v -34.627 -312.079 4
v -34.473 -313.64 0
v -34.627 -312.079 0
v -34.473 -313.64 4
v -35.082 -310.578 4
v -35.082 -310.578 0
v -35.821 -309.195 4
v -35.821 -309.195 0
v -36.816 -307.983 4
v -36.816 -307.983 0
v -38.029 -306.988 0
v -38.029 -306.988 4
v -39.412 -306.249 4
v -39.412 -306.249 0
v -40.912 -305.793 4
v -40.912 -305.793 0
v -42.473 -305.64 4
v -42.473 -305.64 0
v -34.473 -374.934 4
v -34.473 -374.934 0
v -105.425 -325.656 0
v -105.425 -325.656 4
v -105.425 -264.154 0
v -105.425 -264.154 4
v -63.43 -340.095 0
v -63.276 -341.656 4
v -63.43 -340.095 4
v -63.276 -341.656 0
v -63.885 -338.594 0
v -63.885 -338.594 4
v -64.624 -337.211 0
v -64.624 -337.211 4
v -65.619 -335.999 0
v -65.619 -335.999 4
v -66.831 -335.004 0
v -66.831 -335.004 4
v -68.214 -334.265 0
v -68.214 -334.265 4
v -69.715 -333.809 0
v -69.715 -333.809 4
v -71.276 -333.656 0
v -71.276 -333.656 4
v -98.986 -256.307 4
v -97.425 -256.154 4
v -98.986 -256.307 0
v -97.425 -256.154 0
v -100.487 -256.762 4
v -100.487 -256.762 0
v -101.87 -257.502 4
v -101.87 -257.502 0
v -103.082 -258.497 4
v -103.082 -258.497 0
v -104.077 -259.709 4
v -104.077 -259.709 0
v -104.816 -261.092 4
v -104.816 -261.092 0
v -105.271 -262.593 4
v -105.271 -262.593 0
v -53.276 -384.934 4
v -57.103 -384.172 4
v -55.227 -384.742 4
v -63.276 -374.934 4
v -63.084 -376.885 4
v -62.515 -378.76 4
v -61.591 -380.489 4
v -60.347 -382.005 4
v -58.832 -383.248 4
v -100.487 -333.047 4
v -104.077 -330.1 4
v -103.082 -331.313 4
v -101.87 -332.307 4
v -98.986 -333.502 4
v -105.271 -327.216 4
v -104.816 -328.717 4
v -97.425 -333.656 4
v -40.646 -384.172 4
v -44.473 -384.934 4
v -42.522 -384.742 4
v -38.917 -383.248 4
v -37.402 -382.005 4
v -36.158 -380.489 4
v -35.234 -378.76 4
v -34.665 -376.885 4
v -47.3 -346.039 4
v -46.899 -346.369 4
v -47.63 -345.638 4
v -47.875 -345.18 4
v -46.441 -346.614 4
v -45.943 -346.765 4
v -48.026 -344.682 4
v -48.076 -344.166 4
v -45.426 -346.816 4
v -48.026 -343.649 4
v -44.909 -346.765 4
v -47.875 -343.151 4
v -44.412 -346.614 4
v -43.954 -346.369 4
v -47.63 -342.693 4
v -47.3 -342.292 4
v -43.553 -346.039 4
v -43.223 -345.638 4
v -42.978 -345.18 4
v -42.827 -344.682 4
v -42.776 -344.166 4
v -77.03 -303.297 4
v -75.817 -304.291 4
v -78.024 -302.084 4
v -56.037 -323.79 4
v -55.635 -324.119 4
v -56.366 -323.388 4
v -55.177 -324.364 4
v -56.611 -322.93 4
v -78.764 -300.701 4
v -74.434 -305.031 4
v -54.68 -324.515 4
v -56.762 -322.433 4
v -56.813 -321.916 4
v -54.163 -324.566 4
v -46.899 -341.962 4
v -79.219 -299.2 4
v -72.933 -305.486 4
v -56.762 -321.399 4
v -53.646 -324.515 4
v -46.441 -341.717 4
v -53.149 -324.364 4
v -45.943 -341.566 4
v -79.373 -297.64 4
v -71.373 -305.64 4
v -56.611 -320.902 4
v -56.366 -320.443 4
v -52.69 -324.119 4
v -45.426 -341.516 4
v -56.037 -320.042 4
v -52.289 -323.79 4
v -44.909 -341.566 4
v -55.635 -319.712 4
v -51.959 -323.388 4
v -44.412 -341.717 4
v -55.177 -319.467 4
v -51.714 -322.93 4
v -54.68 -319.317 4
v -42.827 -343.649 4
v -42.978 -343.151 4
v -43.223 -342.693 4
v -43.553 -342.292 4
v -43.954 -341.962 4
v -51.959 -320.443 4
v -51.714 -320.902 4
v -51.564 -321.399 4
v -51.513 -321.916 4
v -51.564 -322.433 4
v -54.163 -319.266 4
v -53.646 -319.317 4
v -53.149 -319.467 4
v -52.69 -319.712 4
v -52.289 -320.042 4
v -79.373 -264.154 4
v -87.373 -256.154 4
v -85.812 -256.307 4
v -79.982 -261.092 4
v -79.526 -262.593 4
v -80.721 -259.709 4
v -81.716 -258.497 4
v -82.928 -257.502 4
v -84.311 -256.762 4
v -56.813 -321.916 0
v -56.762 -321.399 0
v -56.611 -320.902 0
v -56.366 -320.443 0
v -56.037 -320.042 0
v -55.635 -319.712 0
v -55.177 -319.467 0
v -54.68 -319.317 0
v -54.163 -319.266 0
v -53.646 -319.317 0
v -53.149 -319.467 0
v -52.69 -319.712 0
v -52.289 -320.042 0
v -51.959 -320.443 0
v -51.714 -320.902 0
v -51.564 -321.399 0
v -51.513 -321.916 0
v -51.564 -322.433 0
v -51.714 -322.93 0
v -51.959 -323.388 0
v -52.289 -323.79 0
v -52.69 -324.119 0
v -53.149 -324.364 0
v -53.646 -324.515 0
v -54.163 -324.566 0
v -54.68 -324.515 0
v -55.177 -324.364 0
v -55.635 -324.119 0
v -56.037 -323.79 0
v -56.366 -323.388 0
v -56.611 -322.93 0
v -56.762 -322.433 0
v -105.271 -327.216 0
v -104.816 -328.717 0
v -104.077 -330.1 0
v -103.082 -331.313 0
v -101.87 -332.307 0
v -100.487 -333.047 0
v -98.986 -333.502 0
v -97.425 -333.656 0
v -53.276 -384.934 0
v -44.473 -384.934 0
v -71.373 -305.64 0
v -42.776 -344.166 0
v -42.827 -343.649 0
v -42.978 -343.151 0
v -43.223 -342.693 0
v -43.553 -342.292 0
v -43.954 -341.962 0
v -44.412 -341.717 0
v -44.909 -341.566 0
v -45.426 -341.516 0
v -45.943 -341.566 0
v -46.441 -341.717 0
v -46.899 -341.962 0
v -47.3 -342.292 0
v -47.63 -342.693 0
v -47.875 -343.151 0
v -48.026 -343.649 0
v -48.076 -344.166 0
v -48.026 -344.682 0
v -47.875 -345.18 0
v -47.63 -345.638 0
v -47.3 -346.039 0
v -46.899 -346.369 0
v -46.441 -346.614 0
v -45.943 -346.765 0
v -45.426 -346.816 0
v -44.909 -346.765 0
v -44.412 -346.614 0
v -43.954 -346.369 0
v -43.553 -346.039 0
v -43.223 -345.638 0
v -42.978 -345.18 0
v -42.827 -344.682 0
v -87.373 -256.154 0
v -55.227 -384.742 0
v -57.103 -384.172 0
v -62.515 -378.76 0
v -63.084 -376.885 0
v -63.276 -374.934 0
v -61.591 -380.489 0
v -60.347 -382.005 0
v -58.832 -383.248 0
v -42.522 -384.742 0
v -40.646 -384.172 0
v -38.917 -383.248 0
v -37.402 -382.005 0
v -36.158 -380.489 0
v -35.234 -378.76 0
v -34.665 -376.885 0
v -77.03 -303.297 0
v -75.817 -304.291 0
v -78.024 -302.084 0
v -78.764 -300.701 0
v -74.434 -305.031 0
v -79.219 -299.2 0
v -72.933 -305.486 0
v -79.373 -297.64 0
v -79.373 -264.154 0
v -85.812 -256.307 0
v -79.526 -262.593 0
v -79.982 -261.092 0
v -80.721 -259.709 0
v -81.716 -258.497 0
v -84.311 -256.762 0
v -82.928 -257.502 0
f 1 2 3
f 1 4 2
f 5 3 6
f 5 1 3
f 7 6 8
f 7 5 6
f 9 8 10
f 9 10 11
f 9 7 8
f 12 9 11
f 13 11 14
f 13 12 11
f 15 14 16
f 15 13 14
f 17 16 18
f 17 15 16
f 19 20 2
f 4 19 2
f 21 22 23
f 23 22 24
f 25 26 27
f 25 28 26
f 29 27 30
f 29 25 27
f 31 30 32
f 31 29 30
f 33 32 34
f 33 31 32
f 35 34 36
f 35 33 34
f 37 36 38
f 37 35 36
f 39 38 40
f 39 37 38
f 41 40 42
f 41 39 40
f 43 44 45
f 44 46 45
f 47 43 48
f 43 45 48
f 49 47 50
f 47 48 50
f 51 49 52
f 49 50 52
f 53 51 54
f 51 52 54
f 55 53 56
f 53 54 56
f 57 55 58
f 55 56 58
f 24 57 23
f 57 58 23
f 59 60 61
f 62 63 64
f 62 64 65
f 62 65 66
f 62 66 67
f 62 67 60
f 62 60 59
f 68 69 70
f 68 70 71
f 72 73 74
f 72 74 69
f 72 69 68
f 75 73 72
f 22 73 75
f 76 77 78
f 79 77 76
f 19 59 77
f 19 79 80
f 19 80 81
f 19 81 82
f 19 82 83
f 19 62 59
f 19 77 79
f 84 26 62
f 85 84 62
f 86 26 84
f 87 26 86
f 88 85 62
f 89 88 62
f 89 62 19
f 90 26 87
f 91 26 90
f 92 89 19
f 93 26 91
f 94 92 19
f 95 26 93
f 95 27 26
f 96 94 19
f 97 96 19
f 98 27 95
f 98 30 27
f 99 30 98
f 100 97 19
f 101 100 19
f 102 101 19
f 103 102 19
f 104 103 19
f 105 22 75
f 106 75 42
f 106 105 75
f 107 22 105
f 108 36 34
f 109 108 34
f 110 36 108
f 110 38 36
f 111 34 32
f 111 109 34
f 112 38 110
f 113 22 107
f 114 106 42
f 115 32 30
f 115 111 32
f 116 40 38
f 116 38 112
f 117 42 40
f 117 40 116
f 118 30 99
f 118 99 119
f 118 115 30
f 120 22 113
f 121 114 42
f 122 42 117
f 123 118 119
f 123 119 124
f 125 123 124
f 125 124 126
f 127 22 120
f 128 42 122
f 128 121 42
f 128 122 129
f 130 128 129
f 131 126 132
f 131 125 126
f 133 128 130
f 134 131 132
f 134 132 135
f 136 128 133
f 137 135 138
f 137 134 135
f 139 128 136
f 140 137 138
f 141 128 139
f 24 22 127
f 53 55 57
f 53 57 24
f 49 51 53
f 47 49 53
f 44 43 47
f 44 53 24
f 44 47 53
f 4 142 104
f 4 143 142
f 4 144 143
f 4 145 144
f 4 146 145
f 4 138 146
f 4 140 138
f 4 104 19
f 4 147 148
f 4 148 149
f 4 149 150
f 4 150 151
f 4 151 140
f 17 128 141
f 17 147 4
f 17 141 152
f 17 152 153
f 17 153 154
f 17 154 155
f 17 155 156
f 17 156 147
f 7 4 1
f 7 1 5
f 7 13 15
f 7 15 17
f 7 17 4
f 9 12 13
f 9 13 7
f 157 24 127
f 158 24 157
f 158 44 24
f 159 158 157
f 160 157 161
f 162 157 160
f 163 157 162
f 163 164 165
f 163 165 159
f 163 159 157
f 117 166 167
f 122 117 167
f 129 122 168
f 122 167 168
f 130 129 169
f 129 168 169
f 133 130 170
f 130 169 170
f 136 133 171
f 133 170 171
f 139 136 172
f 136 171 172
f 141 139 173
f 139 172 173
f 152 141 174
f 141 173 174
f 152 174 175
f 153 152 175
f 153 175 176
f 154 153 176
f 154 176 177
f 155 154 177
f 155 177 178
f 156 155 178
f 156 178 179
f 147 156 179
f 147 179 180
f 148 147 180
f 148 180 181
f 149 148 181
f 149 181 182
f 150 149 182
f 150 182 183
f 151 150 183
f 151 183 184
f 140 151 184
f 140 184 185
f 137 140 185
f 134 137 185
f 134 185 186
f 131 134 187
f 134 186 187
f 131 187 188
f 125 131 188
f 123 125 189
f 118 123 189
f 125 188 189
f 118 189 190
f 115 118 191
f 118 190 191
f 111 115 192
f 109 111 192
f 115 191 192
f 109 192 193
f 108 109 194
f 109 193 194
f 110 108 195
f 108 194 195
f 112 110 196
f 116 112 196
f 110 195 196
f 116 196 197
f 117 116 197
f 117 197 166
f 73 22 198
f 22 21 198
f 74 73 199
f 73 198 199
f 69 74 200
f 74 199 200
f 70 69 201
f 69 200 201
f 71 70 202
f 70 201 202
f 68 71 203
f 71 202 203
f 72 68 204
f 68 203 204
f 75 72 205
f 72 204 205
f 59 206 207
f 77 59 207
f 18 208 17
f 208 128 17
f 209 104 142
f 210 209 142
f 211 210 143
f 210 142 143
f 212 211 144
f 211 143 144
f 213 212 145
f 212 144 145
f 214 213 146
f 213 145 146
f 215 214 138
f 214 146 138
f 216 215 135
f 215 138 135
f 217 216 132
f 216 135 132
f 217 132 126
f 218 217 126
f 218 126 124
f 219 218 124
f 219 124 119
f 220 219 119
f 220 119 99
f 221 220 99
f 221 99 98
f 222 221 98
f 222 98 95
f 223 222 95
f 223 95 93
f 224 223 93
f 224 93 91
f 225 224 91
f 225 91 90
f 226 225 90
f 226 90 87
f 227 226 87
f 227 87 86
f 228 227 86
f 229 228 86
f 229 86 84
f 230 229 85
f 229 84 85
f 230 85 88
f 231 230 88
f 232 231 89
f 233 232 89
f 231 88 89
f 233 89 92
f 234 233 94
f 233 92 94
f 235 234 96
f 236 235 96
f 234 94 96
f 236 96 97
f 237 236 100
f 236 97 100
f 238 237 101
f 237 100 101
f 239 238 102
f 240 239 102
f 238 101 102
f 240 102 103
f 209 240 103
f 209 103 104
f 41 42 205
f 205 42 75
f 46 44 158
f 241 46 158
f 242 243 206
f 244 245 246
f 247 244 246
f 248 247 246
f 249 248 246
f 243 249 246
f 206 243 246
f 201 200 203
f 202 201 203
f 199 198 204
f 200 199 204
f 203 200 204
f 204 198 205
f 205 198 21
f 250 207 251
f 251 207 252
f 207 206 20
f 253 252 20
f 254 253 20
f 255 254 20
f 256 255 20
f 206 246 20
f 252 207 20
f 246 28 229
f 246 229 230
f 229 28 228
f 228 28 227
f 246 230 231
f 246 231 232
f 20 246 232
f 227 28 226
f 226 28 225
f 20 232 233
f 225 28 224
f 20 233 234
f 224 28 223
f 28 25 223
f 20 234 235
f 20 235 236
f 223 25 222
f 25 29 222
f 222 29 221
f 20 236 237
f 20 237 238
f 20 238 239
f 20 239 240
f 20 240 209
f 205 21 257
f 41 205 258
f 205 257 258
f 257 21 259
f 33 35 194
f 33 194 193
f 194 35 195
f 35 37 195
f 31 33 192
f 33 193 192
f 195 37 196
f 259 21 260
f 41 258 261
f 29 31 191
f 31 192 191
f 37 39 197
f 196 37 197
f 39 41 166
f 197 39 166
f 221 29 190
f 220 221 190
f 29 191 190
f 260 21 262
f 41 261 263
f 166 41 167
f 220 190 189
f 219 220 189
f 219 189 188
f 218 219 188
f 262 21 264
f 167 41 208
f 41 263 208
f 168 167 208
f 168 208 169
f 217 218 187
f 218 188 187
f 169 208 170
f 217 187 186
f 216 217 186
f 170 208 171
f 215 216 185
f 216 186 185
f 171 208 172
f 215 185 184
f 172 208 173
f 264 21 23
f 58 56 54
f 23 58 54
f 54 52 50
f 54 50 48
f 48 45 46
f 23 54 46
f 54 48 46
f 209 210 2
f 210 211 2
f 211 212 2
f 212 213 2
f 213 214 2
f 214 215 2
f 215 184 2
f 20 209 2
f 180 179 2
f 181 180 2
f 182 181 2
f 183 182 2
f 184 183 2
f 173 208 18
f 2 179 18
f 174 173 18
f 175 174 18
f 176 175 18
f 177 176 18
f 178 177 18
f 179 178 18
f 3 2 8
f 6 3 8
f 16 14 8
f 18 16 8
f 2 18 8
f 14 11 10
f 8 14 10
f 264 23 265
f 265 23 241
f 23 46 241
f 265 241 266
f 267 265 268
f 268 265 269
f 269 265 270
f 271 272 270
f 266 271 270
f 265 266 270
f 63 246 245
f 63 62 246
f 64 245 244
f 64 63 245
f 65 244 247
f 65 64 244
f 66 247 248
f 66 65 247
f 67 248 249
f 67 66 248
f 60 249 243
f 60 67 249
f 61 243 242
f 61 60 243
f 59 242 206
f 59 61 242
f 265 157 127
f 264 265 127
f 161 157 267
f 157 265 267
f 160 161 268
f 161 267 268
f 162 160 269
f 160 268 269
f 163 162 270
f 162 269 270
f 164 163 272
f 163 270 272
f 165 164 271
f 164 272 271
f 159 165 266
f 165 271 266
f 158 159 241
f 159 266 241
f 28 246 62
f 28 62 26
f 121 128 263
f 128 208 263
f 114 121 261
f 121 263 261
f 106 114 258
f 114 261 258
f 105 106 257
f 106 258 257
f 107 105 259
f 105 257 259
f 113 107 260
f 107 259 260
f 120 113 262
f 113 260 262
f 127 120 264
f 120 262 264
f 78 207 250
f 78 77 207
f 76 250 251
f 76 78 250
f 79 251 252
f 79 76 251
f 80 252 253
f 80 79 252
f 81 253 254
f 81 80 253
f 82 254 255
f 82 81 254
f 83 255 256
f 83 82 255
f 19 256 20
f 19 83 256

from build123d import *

# Parameters (mm, degrees)
SKETCH1_W            = 28.802861634
SKETCH1_H            = 131.078546172
BOSS_EXTRUDE1_DEPTH  = 4
M5_CLEARANCE_HOLE1_D = 5.3
FILLET1_R            = 10
M5_CLEARANCE_HOLE2_D = 5.3
BOSS_EXTRUDE2_DEPTH  = 4
SKETCH8_W            = 47.461989215
SKETCH8_H            = 54.002733852
CUT_EXTRUDE1_DEPTH   = 14.4
FILLET2_R            = 8


with BuildPart() as part:
    # Sketch1 → Boss-Extrude1 (new body)
    with BuildSketch(Plane.XY):
        with Locations((-48.87450938, -319.394379884)):
            Rectangle(SKETCH1_W, SKETCH1_H)
    extrude(amount=BOSS_EXTRUDE1_DEPTH)

    # M5 Clearance Hole1 (through all)
    with Locations(Plane.XY.offset(4)):
        with Locations((-54.16270611, -321.915681156), (-54.16270611, -293.415681156)):
            Hole(M5_CLEARANCE_HOLE1_D / 2)

    # Fillet1
    fillet1_edges = [part.edges().sort_by_distance(p)[0] for p in [
        (-63.275940197, -253.855106798, 2),
        (-34.473078563, -253.855106798, 2),
        (-34.473078563, -384.93365297, 2),
        (-63.275940197, -384.93365297, 2),
    ]]
    fillet(fillet1_edges, radius=FILLET1_R)

    # M5 Clearance Hole2 (through all)
    with Locations(Plane(origin=(0, 0, 0), x_dir=(-1, 0, 0), z_dir=(0, 0, -1))):
        with Locations((45.426427008, -344.165502047)):
            Hole(M5_CLEARANCE_HOLE2_D / 2)

    # Sketch7 → Boss-Extrude2 (add)
    with BuildSketch(Plane.XY.offset(4)):
        Polygon((-63.275940197, -333.655681156), (-105.425150803, -333.655681156), (-105.425150803, -256.153534459), (-79.372706111, -256.153534459), (-79.372706111, -305.639740344), (-63.275940197, -305.639740344), align=None)
    extrude(amount=-BOSS_EXTRUDE2_DEPTH)

    # Sketch8 → Cut-Extrude1 (cut)
    with BuildSketch(Plane(origin=(0, 0, 0), x_dir=(-1, 0, 0), z_dir=(0, 0, -1))):
        with Locations((47.593328547, -278.638373418)):
            Rectangle(SKETCH8_W, SKETCH8_H)
    extrude(amount=-CUT_EXTRUDE1_DEPTH, mode=Mode.SUBTRACT)

    # Fillet2
    fillet2_edges = [part.edges().sort_by_distance(p)[0] for p in [
        (-63.275940197, -333.655681156, 2),
        (-105.425150803, -333.655681156, 2),
        (-105.425150803, -256.153534459, 2),
        (-79.372706111, -256.153534459, 2),
        (-79.372706111, -305.639740344, 2),
        (-34.473078563, -305.639740344, 2),
    ]]
    fillet(fillet2_edges, radius=FILLET2_R)


solid = part.part
